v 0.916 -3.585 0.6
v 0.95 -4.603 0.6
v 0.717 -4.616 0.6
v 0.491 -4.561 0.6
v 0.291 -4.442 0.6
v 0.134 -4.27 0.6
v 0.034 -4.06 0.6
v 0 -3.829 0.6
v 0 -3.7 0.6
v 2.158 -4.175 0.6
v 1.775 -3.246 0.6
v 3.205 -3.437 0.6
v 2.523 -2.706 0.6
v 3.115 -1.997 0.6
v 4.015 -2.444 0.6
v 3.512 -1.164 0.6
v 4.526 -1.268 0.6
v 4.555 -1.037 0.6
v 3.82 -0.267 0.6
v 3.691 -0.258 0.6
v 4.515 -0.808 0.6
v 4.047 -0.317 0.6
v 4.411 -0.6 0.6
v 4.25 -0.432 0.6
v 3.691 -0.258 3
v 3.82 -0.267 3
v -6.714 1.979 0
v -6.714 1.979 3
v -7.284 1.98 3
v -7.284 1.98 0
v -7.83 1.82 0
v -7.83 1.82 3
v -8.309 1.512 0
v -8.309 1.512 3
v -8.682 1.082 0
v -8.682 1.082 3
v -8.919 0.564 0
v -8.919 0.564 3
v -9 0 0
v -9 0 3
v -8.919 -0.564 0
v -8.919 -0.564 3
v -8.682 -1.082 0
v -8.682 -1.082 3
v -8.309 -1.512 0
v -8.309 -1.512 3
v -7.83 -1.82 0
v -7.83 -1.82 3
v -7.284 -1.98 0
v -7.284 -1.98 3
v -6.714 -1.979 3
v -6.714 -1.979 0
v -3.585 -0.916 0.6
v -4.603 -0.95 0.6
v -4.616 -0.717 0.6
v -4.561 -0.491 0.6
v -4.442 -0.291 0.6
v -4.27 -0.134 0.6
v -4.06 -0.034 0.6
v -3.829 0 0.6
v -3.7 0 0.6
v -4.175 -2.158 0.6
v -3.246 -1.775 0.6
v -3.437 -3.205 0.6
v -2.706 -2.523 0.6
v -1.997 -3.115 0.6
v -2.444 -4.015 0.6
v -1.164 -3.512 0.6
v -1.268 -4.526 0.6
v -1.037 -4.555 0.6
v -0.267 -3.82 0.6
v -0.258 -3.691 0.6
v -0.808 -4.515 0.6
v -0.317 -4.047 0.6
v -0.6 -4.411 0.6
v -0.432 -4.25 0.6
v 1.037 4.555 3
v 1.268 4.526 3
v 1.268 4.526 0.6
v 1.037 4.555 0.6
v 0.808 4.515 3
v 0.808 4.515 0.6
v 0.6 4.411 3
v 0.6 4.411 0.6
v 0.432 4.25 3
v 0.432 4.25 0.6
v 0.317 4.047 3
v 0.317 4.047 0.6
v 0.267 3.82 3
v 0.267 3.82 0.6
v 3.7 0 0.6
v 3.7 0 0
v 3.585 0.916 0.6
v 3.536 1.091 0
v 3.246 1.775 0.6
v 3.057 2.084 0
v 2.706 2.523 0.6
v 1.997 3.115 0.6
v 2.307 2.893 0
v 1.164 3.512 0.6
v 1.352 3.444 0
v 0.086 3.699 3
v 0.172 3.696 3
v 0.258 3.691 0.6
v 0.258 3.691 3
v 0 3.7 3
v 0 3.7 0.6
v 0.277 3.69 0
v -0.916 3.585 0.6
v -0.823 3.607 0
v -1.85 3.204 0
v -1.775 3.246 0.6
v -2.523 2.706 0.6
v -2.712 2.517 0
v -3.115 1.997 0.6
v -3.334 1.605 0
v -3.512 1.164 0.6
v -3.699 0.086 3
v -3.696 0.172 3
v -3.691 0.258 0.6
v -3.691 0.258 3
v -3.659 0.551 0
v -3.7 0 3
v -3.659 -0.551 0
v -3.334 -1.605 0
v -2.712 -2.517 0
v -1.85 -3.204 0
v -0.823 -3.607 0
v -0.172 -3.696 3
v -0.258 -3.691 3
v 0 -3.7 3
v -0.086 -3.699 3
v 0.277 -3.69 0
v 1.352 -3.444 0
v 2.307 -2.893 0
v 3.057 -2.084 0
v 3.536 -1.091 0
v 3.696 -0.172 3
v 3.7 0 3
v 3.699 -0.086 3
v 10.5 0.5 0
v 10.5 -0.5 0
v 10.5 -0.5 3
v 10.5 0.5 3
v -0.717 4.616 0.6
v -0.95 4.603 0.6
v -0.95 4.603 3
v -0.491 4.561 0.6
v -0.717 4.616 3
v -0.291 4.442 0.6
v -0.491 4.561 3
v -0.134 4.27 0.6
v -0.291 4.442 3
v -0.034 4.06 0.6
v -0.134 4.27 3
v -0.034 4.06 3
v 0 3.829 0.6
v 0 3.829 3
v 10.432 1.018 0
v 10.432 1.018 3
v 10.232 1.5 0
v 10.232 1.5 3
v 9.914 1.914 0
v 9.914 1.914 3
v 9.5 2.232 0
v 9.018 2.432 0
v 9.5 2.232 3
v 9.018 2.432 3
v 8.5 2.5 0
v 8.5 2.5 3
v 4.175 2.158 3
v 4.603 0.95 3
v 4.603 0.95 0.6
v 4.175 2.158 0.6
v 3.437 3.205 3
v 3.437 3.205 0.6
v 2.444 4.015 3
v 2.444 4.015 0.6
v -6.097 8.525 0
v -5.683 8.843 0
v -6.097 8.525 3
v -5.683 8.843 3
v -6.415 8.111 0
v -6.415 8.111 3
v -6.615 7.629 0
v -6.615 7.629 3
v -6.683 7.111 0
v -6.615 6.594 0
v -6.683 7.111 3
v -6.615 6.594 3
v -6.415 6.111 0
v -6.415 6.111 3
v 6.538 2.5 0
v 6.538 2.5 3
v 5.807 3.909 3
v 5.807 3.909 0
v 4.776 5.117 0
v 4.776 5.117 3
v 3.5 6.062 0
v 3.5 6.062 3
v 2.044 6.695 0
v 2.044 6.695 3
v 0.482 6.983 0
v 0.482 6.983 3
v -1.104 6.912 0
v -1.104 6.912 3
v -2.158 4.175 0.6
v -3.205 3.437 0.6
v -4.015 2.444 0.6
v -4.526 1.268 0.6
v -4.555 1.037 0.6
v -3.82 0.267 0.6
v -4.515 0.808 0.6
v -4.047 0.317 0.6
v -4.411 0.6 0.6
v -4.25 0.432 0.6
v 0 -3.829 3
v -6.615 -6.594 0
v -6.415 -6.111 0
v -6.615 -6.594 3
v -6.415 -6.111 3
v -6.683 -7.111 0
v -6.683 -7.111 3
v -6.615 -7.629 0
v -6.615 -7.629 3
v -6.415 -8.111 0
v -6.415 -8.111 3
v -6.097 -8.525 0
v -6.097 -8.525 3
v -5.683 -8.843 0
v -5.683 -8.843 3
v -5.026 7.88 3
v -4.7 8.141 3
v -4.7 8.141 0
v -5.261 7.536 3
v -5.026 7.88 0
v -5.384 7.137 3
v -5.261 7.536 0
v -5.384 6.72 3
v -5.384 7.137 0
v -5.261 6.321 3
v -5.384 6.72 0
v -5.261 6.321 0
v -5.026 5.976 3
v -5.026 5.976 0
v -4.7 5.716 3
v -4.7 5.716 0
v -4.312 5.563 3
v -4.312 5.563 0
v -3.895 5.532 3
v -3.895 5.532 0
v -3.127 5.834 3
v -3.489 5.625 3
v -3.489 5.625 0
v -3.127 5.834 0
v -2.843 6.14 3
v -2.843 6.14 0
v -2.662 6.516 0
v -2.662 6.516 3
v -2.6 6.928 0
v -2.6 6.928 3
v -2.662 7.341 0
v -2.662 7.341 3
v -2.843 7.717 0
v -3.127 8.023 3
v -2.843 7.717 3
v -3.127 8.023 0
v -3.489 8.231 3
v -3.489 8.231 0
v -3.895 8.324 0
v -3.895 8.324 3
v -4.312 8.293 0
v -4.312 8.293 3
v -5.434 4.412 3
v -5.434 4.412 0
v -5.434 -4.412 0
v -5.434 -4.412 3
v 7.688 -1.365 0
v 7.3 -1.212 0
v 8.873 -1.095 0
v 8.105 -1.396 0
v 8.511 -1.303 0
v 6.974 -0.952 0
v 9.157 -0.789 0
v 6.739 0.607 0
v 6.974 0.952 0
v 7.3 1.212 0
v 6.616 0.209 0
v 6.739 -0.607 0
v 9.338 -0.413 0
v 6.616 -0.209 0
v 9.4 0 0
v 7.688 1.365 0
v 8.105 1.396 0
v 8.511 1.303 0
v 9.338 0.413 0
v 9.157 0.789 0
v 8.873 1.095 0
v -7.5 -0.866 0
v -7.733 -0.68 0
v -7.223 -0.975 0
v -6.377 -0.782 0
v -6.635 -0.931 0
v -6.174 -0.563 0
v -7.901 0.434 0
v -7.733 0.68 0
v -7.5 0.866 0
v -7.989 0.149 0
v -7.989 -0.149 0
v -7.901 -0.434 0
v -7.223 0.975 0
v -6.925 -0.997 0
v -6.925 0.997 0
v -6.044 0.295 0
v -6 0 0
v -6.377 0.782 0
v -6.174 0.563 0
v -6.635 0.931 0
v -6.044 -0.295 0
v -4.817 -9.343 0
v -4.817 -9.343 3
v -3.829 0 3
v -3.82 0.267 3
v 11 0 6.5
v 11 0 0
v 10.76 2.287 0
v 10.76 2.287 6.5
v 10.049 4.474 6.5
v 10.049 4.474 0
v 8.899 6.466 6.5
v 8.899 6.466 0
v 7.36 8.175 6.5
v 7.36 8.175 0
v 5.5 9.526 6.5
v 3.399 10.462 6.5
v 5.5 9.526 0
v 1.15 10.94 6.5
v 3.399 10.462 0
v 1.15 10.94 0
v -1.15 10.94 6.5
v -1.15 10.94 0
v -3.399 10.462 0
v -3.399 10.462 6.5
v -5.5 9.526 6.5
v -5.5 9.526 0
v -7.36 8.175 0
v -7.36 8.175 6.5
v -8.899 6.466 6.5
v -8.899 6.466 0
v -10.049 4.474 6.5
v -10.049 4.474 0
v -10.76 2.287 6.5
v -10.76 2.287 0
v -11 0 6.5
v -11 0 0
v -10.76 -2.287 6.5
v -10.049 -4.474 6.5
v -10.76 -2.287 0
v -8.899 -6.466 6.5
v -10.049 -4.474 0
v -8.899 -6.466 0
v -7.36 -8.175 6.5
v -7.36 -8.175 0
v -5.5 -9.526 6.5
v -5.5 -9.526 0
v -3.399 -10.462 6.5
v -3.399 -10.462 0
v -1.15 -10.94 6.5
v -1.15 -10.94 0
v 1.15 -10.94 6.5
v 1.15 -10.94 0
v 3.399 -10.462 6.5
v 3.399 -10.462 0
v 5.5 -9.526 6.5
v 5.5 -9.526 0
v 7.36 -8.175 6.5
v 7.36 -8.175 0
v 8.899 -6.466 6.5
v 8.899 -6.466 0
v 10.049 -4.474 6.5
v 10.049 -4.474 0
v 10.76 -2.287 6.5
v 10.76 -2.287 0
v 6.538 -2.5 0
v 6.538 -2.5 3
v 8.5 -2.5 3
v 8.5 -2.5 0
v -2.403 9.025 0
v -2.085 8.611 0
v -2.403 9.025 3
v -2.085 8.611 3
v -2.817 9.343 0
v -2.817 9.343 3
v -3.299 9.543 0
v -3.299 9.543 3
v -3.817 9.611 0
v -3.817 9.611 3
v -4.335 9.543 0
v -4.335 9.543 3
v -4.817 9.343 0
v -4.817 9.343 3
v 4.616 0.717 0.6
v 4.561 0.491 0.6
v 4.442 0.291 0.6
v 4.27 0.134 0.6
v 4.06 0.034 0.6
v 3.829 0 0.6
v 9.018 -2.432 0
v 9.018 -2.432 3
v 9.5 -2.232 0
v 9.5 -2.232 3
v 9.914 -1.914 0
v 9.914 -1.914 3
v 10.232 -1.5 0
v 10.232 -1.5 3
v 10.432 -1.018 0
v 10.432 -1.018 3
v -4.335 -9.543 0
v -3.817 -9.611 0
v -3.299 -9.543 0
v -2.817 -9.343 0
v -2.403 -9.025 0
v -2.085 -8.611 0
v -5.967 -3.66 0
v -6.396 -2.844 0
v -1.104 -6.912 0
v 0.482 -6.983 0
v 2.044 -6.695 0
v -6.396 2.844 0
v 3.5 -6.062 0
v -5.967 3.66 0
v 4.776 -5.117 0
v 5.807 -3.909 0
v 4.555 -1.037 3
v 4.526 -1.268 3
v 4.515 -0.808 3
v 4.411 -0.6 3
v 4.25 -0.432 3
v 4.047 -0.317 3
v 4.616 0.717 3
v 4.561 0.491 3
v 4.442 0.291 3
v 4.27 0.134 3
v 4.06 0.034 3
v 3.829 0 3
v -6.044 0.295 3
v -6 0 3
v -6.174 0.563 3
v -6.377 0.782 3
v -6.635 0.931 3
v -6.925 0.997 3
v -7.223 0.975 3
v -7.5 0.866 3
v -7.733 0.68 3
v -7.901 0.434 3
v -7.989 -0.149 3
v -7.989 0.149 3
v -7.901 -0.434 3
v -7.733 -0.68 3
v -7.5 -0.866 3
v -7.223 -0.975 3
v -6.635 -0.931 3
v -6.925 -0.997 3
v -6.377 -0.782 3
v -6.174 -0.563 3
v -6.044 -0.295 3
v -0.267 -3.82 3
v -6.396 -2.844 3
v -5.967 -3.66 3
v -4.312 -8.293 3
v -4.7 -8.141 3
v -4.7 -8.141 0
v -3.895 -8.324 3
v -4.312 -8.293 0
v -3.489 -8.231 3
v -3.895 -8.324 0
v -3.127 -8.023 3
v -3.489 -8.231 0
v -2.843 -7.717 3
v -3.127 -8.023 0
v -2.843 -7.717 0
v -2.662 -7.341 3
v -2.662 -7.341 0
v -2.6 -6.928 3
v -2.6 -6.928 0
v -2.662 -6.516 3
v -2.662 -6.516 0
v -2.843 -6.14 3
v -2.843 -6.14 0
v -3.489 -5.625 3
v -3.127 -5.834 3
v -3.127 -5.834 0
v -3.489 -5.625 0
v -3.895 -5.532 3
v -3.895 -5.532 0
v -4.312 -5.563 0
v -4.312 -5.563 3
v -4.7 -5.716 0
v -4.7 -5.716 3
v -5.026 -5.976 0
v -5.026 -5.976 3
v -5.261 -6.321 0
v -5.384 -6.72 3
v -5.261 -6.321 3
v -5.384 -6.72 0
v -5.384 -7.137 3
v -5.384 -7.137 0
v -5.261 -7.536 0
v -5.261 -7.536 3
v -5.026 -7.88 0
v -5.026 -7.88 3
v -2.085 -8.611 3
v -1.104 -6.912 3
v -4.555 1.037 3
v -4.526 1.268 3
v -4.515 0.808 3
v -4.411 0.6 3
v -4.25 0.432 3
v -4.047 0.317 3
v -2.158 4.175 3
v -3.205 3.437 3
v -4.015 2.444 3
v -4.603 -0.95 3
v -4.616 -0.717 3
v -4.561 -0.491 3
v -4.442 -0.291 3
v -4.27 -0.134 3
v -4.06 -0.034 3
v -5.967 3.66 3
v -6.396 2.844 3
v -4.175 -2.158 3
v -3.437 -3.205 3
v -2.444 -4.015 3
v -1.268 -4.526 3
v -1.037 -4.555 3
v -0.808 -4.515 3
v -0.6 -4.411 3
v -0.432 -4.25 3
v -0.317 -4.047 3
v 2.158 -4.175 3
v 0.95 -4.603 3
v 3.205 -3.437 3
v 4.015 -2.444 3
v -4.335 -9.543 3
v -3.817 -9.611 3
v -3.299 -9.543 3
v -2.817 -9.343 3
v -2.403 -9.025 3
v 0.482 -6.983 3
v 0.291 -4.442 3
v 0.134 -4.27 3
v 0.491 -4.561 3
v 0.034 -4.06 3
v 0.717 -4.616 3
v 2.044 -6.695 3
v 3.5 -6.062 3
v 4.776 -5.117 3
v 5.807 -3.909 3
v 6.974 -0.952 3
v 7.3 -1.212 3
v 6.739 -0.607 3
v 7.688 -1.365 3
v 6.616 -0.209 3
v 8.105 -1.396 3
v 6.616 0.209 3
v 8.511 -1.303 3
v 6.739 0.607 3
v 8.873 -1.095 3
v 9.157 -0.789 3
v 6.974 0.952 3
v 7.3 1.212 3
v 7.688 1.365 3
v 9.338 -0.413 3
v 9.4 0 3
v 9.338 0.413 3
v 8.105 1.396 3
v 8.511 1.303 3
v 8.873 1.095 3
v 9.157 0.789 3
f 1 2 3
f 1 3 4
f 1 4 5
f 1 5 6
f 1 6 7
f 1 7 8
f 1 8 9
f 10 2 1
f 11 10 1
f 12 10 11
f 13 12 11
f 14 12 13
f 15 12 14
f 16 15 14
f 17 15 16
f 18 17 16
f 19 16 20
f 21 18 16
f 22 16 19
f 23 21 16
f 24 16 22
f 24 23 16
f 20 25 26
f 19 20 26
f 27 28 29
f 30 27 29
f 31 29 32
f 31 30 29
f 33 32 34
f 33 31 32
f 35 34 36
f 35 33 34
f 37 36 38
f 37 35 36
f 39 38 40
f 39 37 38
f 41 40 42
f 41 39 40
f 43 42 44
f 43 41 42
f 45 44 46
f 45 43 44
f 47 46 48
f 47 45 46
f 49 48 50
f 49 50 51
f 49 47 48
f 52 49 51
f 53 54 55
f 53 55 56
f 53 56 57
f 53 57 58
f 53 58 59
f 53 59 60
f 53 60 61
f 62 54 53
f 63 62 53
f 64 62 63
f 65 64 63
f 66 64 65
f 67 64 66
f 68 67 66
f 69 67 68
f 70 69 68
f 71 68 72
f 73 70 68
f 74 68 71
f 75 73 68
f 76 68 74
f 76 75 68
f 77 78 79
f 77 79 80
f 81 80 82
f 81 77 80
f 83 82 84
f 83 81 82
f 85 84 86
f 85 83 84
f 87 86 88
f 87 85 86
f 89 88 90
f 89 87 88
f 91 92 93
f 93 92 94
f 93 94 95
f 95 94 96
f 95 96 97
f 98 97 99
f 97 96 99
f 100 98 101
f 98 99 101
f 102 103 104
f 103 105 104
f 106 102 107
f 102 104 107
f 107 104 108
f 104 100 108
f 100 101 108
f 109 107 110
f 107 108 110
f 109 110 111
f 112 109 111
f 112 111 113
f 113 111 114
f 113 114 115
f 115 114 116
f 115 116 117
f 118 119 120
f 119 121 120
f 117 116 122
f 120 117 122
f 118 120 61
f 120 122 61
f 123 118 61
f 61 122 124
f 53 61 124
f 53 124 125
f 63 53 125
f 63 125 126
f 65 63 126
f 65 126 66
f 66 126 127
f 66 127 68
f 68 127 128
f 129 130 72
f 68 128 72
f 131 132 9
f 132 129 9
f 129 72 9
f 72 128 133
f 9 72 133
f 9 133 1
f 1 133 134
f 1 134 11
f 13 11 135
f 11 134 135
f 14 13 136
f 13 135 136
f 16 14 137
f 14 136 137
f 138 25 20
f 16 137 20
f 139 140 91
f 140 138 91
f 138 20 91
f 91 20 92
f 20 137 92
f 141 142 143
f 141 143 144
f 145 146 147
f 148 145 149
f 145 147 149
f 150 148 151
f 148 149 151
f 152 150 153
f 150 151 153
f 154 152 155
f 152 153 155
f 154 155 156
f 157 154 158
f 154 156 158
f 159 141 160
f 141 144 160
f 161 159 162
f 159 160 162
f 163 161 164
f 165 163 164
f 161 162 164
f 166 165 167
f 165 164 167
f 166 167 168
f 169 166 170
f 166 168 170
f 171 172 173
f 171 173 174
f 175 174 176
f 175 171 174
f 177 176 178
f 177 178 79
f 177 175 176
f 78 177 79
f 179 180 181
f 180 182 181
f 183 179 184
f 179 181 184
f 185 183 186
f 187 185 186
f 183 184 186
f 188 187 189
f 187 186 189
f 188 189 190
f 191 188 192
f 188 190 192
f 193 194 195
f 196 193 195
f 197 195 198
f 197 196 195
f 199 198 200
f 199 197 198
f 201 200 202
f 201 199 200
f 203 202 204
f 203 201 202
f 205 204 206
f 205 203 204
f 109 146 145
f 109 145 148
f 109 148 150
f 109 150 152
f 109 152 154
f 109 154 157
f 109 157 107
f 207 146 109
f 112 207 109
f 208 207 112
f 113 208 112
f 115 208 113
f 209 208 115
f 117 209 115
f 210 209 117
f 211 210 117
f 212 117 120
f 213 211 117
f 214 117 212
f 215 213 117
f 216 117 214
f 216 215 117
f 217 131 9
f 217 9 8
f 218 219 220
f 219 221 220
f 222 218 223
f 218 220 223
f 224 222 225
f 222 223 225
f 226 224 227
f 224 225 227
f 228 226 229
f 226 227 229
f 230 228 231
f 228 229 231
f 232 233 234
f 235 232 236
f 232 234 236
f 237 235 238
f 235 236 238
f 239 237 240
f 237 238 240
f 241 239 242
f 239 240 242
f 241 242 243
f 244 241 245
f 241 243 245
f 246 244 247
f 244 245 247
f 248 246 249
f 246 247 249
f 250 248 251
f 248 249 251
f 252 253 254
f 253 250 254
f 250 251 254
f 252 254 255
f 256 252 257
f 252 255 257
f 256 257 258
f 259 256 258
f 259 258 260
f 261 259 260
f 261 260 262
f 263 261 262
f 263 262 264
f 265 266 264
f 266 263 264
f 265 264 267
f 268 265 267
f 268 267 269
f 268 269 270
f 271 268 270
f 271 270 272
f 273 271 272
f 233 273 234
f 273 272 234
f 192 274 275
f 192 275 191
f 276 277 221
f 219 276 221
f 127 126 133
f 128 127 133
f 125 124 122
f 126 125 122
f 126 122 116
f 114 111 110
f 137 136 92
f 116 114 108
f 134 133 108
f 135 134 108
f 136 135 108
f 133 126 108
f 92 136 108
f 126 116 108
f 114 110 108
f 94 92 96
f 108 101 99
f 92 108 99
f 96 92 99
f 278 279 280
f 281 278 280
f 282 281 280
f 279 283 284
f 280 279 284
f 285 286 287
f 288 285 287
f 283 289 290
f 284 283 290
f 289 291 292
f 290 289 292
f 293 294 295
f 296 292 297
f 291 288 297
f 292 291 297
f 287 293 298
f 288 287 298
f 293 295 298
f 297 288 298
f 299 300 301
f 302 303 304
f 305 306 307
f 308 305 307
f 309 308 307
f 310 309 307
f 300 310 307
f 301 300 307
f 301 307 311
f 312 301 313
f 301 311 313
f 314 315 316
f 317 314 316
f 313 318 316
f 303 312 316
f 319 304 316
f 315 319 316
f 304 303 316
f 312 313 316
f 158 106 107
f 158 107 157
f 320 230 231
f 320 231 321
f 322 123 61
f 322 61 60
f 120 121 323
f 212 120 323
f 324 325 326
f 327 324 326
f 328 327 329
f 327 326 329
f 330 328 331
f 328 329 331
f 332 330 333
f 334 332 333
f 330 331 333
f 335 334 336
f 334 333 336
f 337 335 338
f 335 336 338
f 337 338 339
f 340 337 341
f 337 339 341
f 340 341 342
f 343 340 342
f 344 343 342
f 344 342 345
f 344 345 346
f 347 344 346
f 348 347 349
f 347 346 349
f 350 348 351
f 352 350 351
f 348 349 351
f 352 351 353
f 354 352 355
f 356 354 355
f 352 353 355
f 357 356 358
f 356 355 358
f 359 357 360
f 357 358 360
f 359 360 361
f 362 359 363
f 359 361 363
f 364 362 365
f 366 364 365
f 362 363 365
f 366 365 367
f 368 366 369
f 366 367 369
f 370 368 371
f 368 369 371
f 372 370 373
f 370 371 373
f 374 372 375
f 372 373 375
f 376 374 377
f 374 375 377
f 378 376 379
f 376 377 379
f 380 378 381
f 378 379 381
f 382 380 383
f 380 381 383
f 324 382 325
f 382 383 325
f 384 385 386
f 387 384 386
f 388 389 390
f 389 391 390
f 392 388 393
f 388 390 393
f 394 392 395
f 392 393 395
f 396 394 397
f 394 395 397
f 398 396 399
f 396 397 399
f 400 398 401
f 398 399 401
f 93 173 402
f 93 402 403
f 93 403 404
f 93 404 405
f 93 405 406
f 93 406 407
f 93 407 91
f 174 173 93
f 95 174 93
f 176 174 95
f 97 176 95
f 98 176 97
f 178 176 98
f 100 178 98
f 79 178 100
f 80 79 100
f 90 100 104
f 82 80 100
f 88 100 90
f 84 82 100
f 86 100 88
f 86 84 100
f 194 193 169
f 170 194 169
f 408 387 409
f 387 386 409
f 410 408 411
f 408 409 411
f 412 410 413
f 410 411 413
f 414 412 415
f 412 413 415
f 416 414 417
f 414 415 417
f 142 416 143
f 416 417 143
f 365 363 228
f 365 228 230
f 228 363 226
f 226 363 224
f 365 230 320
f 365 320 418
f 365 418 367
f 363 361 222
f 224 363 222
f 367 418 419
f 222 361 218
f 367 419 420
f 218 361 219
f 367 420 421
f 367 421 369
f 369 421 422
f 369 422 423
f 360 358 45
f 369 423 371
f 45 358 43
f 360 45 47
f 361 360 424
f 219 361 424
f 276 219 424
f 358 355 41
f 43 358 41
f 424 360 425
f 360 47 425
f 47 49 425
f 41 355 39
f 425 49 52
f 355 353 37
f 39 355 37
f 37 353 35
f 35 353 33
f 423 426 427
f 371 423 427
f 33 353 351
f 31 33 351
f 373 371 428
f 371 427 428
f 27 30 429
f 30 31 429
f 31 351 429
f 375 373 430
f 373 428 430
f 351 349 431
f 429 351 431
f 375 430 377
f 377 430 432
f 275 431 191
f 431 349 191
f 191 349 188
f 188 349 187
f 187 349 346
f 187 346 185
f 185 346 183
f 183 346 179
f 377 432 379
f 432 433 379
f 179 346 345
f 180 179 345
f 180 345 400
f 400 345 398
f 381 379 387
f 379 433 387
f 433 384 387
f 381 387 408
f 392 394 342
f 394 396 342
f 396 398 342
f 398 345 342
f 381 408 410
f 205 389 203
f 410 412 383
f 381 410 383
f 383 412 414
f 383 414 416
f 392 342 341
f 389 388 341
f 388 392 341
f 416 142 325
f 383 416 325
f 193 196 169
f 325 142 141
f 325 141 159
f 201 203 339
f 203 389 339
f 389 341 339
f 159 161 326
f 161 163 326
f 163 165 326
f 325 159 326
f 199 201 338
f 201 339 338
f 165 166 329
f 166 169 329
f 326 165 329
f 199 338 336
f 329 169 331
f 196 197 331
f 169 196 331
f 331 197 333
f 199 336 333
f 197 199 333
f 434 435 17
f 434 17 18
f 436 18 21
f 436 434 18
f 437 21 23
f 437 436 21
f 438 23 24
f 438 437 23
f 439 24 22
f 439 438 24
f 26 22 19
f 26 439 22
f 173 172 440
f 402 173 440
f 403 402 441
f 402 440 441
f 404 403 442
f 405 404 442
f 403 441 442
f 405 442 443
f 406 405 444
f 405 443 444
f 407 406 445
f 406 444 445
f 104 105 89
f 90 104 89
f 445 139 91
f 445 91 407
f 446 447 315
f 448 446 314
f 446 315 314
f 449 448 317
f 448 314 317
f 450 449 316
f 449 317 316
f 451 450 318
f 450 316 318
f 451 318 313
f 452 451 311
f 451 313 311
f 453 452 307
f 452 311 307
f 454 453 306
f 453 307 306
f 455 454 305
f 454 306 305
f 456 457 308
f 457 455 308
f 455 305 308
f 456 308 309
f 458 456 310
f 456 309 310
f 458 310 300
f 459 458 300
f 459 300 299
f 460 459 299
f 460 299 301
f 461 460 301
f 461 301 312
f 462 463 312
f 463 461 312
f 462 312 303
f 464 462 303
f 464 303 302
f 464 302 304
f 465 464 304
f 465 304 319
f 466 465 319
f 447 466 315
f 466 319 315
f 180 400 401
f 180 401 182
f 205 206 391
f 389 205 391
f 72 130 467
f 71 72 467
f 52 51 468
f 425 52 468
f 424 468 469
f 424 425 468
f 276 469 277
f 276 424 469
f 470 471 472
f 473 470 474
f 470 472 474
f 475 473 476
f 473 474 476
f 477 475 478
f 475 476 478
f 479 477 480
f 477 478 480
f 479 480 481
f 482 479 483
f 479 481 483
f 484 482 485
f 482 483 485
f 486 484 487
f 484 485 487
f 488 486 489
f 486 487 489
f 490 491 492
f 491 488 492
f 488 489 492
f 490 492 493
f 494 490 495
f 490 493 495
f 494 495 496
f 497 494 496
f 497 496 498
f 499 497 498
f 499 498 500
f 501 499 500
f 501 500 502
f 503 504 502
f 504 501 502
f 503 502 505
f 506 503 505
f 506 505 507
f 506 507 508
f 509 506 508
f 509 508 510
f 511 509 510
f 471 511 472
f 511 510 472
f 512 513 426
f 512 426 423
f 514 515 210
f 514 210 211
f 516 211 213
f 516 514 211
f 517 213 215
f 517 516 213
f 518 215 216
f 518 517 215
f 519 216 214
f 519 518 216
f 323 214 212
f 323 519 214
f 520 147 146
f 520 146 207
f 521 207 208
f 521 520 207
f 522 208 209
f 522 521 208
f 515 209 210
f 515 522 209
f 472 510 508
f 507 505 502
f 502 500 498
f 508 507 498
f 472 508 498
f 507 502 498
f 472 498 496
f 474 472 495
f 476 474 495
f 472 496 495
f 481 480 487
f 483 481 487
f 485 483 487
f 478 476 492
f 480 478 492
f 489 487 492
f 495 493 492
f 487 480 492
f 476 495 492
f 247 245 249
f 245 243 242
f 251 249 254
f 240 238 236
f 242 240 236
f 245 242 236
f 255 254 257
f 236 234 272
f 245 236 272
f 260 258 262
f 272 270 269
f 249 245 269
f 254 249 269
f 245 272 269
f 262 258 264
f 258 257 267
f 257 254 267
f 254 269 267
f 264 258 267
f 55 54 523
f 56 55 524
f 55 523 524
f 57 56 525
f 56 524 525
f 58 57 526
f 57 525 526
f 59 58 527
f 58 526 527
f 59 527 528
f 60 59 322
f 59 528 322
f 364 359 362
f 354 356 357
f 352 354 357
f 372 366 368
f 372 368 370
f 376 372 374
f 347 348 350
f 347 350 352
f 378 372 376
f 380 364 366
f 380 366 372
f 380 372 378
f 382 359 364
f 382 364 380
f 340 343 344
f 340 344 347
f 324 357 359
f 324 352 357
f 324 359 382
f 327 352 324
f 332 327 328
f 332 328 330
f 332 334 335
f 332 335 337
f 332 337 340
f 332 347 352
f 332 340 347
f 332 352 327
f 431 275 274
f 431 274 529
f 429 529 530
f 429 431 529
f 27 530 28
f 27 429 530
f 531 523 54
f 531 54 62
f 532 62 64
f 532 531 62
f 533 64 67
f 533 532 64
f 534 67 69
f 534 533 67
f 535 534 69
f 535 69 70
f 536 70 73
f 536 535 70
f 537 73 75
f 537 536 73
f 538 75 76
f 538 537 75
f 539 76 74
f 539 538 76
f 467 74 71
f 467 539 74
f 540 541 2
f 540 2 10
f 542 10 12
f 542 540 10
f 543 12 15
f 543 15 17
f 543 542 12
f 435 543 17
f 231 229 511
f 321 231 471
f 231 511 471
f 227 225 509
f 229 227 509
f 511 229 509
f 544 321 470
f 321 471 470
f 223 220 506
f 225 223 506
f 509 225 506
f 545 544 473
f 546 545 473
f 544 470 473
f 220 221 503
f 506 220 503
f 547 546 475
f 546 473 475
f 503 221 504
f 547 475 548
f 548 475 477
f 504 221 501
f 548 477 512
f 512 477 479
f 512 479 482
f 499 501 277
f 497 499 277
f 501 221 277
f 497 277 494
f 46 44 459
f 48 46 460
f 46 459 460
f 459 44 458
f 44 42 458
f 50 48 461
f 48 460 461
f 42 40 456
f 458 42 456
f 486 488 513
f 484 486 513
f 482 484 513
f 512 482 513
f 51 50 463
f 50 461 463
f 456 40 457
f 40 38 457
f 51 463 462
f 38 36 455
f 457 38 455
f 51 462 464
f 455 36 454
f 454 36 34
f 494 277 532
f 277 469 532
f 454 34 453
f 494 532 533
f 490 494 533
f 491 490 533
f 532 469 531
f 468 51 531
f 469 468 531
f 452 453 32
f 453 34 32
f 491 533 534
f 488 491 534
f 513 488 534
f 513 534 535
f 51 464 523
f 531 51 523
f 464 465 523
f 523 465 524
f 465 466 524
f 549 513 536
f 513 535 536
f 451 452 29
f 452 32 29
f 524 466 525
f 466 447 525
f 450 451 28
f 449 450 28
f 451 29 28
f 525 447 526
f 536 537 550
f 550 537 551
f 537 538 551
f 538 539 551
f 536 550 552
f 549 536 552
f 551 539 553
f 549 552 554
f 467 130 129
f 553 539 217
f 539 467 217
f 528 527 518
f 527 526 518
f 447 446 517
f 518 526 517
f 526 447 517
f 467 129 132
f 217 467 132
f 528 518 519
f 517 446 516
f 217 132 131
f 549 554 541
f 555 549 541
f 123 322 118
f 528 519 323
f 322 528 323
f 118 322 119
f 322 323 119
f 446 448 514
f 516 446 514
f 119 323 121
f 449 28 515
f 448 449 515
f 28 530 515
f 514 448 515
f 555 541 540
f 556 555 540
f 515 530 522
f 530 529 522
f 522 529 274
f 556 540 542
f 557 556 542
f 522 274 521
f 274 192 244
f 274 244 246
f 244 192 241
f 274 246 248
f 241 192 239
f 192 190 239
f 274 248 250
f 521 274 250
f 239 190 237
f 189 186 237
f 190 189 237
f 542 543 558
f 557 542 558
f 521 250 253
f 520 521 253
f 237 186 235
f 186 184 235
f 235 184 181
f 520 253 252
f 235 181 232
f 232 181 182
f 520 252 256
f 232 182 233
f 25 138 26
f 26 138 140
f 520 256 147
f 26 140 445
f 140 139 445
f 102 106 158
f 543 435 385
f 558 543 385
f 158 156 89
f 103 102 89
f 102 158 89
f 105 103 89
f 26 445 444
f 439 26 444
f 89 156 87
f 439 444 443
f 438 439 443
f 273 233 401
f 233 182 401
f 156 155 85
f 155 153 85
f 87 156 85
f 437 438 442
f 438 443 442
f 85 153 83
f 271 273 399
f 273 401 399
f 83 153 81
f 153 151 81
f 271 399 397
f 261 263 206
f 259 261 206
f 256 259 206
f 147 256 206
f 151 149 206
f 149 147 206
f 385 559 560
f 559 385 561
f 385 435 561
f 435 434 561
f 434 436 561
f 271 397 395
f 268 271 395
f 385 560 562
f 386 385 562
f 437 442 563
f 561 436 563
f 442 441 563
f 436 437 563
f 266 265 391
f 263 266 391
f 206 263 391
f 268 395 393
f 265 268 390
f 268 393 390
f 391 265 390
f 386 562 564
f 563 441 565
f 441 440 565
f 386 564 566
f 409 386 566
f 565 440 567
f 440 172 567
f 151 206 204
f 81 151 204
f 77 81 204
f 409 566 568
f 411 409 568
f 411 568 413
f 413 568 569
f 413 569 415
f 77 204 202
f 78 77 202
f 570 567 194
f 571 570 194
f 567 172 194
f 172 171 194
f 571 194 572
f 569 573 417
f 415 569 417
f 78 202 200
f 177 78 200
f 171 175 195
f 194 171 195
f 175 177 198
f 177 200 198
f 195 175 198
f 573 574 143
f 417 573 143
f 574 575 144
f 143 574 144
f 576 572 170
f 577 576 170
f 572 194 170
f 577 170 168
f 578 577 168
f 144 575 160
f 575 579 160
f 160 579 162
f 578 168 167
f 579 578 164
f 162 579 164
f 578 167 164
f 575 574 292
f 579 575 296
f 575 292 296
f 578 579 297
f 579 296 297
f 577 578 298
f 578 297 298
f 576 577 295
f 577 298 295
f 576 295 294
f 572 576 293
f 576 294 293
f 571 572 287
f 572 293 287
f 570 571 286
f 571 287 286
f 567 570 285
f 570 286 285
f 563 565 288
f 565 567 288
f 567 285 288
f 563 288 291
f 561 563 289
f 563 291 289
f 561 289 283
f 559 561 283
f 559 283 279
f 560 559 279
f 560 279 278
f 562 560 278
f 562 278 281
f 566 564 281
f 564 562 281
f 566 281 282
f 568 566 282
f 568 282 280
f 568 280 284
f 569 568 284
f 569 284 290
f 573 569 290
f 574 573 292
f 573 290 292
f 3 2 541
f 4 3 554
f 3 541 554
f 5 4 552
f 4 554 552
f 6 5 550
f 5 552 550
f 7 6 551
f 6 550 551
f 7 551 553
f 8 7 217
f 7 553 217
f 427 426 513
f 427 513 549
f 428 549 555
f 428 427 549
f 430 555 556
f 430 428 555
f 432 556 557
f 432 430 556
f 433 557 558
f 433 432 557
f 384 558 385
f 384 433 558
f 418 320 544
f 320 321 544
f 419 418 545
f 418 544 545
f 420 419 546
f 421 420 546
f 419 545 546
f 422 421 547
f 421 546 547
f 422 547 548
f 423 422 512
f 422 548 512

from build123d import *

# Parameters (mm, degrees)
CYLINDER040_R     = 1
CYLINDER040_DEPTH = 10
CYLINDER037_R     = 3.7
CYLINDER037_DEPTH = 10
CYLINDER038_W     = 4.7
CYLINDER038_H     = 10
CYLINDER038_ANGLE = 86
FILLET003_R       = 0.79
ARRAY006_COUNT    = 4
CYLINDER036_R     = 1.4
CYLINDER036_DEPTH = 10
ARRAY004_COUNT    = 3
BOX003_W          = 10
BOX003_H          = 5
BOX003_DEPTH      = 3
FILLET002_R       = 2
ARRAY005_COUNT    = 3
CYLINDER035_R     = 7
CYLINDER035_DEPTH = 3
CYLINDER039_R     = 2
CYLINDER039_DEPTH = 3
CYLINDER042_R     = 11
CYLINDER042_DEPTH = 6.5


with BuildPart() as cylinder022:
    # Cylinder040 → Cylinder040 (new body)
    with BuildSketch(Plane(origin=(-7, 0, 0), x_dir=(1, 0, 0), z_dir=(0, 0, 1))):
        Circle(CYLINDER040_R)
    extrude(amount=CYLINDER040_DEPTH)


with BuildPart() as mountplateinnerhole002:
    # Cylinder037 → Cylinder037 (new body)
    with BuildSketch(Plane.XY):
        Circle(CYLINDER037_R)
    extrude(amount=CYLINDER037_DEPTH)


with BuildPart() as array006:
    # Cylinder038 → Cylinder038 (revolve)
    with BuildSketch(Plane(origin=(0, 0, 0.6), x_dir=(1, 0, 0), z_dir=(0, -1, 0))):
        with Locations((2.35, 5)):
            Rectangle(CYLINDER038_W, CYLINDER038_H)
    revolve(axis=Axis((0, 0, 0.6), (0, 0, 1)), revolution_arc=CYLINDER038_ANGLE)

    # Fillet003
    fillet003_edges = [array006.edges().sort_by_distance(p)[0] for p in [
        (0.327855, 4.688551, 5.6),
        (4.7, 0, 5.6),
    ]]
    fillet(fillet003_edges, radius=FILLET003_R)

    # Array006: Array006 ×4 about axis
    array006_axis = Axis((0, 0, 0), (0, 0, 1))


with BuildPart() as array006_1:
    add(array006.part)
    for i in range(1, ARRAY006_COUNT):
        add(array006.part.rotate(array006_axis, i * 360 / ARRAY006_COUNT))


with BuildPart() as fusion011:
    # Cylinder036 → Cylinder036 (new body)
    with BuildSketch(Plane(origin=(8, 0, 0), x_dir=(1, 0, 0), z_dir=(0, 0, 1))):
        Circle(CYLINDER036_R)
    extrude(amount=CYLINDER036_DEPTH)

    # Array004: Fusion011 ×3 about axis
    array004_axis = Axis((0, 0, 0), (0, 0, 1))


with BuildPart() as fusion011_1:
    add(fusion011.part)
    for i in range(1, ARRAY004_COUNT):
        add(fusion011.part.rotate(array004_axis, i * 360 / ARRAY004_COUNT))

    # Fusion011: union Cylinder022, MountPlateInnerHole002, Array006
    add(cylinder022.part)
    add(mountplateinnerhole002.part)
    add(array006_1.part)


with BuildPart() as array005:
    # Box003 → Box003 (new body)
    with BuildSketch(Plane(origin=(0.5, -2.5, 0), x_dir=(1, 0, 0), z_dir=(0, 0, 1))):
        with Locations((5, 2.5)):
            Rectangle(BOX003_W, BOX003_H)
    extrude(amount=BOX003_DEPTH)

    # Fillet002
    fillet002_edges = [array005.edges().sort_by_distance(p)[0] for p in [
        (10.5, -2.5, 1.5),
        (10.5, 2.5, 1.5),
    ]]
    fillet(fillet002_edges, radius=FILLET002_R)

    # Array005: Array005 ×3 about axis
    array005_axis = Axis((0, 0, 0), (0, 0, 1))


with BuildPart() as array005_1:
    add(array005.part)
    for i in range(1, ARRAY005_COUNT):
        add(array005.part.rotate(array005_axis, i * 360 / ARRAY005_COUNT))


with BuildPart() as mountplatebody002:
    # Cylinder035 → Cylinder035 (new body)
    with BuildSketch(Plane.XY):
        Circle(CYLINDER035_R)
    extrude(amount=CYLINDER035_DEPTH)


with BuildPart() as cut011:
    # Cylinder039 → Cylinder039 (new body)
    with BuildSketch(Plane(origin=(-7, 0, 0), x_dir=(1, 0, 0), z_dir=(0, 0, 1))):
        Circle(CYLINDER039_R)
    extrude(amount=CYLINDER039_DEPTH)

    # Fusion010: union Array005, MountPlateBody002
    add(array005_1.part)
    add(mountplatebody002.part)

    # Cut011: cut Fusion011
    add(fusion011_1.part, mode=Mode.SUBTRACT)


with BuildPart() as cut012:
    # Cylinder042 → Cylinder042 (new body)
    with BuildSketch(Plane.XY):
        Circle(CYLINDER042_R)
    extrude(amount=CYLINDER042_DEPTH)

    # Cut012: cut Cut011
    add(cut011.part, mode=Mode.SUBTRACT)


solid = cut012.part
